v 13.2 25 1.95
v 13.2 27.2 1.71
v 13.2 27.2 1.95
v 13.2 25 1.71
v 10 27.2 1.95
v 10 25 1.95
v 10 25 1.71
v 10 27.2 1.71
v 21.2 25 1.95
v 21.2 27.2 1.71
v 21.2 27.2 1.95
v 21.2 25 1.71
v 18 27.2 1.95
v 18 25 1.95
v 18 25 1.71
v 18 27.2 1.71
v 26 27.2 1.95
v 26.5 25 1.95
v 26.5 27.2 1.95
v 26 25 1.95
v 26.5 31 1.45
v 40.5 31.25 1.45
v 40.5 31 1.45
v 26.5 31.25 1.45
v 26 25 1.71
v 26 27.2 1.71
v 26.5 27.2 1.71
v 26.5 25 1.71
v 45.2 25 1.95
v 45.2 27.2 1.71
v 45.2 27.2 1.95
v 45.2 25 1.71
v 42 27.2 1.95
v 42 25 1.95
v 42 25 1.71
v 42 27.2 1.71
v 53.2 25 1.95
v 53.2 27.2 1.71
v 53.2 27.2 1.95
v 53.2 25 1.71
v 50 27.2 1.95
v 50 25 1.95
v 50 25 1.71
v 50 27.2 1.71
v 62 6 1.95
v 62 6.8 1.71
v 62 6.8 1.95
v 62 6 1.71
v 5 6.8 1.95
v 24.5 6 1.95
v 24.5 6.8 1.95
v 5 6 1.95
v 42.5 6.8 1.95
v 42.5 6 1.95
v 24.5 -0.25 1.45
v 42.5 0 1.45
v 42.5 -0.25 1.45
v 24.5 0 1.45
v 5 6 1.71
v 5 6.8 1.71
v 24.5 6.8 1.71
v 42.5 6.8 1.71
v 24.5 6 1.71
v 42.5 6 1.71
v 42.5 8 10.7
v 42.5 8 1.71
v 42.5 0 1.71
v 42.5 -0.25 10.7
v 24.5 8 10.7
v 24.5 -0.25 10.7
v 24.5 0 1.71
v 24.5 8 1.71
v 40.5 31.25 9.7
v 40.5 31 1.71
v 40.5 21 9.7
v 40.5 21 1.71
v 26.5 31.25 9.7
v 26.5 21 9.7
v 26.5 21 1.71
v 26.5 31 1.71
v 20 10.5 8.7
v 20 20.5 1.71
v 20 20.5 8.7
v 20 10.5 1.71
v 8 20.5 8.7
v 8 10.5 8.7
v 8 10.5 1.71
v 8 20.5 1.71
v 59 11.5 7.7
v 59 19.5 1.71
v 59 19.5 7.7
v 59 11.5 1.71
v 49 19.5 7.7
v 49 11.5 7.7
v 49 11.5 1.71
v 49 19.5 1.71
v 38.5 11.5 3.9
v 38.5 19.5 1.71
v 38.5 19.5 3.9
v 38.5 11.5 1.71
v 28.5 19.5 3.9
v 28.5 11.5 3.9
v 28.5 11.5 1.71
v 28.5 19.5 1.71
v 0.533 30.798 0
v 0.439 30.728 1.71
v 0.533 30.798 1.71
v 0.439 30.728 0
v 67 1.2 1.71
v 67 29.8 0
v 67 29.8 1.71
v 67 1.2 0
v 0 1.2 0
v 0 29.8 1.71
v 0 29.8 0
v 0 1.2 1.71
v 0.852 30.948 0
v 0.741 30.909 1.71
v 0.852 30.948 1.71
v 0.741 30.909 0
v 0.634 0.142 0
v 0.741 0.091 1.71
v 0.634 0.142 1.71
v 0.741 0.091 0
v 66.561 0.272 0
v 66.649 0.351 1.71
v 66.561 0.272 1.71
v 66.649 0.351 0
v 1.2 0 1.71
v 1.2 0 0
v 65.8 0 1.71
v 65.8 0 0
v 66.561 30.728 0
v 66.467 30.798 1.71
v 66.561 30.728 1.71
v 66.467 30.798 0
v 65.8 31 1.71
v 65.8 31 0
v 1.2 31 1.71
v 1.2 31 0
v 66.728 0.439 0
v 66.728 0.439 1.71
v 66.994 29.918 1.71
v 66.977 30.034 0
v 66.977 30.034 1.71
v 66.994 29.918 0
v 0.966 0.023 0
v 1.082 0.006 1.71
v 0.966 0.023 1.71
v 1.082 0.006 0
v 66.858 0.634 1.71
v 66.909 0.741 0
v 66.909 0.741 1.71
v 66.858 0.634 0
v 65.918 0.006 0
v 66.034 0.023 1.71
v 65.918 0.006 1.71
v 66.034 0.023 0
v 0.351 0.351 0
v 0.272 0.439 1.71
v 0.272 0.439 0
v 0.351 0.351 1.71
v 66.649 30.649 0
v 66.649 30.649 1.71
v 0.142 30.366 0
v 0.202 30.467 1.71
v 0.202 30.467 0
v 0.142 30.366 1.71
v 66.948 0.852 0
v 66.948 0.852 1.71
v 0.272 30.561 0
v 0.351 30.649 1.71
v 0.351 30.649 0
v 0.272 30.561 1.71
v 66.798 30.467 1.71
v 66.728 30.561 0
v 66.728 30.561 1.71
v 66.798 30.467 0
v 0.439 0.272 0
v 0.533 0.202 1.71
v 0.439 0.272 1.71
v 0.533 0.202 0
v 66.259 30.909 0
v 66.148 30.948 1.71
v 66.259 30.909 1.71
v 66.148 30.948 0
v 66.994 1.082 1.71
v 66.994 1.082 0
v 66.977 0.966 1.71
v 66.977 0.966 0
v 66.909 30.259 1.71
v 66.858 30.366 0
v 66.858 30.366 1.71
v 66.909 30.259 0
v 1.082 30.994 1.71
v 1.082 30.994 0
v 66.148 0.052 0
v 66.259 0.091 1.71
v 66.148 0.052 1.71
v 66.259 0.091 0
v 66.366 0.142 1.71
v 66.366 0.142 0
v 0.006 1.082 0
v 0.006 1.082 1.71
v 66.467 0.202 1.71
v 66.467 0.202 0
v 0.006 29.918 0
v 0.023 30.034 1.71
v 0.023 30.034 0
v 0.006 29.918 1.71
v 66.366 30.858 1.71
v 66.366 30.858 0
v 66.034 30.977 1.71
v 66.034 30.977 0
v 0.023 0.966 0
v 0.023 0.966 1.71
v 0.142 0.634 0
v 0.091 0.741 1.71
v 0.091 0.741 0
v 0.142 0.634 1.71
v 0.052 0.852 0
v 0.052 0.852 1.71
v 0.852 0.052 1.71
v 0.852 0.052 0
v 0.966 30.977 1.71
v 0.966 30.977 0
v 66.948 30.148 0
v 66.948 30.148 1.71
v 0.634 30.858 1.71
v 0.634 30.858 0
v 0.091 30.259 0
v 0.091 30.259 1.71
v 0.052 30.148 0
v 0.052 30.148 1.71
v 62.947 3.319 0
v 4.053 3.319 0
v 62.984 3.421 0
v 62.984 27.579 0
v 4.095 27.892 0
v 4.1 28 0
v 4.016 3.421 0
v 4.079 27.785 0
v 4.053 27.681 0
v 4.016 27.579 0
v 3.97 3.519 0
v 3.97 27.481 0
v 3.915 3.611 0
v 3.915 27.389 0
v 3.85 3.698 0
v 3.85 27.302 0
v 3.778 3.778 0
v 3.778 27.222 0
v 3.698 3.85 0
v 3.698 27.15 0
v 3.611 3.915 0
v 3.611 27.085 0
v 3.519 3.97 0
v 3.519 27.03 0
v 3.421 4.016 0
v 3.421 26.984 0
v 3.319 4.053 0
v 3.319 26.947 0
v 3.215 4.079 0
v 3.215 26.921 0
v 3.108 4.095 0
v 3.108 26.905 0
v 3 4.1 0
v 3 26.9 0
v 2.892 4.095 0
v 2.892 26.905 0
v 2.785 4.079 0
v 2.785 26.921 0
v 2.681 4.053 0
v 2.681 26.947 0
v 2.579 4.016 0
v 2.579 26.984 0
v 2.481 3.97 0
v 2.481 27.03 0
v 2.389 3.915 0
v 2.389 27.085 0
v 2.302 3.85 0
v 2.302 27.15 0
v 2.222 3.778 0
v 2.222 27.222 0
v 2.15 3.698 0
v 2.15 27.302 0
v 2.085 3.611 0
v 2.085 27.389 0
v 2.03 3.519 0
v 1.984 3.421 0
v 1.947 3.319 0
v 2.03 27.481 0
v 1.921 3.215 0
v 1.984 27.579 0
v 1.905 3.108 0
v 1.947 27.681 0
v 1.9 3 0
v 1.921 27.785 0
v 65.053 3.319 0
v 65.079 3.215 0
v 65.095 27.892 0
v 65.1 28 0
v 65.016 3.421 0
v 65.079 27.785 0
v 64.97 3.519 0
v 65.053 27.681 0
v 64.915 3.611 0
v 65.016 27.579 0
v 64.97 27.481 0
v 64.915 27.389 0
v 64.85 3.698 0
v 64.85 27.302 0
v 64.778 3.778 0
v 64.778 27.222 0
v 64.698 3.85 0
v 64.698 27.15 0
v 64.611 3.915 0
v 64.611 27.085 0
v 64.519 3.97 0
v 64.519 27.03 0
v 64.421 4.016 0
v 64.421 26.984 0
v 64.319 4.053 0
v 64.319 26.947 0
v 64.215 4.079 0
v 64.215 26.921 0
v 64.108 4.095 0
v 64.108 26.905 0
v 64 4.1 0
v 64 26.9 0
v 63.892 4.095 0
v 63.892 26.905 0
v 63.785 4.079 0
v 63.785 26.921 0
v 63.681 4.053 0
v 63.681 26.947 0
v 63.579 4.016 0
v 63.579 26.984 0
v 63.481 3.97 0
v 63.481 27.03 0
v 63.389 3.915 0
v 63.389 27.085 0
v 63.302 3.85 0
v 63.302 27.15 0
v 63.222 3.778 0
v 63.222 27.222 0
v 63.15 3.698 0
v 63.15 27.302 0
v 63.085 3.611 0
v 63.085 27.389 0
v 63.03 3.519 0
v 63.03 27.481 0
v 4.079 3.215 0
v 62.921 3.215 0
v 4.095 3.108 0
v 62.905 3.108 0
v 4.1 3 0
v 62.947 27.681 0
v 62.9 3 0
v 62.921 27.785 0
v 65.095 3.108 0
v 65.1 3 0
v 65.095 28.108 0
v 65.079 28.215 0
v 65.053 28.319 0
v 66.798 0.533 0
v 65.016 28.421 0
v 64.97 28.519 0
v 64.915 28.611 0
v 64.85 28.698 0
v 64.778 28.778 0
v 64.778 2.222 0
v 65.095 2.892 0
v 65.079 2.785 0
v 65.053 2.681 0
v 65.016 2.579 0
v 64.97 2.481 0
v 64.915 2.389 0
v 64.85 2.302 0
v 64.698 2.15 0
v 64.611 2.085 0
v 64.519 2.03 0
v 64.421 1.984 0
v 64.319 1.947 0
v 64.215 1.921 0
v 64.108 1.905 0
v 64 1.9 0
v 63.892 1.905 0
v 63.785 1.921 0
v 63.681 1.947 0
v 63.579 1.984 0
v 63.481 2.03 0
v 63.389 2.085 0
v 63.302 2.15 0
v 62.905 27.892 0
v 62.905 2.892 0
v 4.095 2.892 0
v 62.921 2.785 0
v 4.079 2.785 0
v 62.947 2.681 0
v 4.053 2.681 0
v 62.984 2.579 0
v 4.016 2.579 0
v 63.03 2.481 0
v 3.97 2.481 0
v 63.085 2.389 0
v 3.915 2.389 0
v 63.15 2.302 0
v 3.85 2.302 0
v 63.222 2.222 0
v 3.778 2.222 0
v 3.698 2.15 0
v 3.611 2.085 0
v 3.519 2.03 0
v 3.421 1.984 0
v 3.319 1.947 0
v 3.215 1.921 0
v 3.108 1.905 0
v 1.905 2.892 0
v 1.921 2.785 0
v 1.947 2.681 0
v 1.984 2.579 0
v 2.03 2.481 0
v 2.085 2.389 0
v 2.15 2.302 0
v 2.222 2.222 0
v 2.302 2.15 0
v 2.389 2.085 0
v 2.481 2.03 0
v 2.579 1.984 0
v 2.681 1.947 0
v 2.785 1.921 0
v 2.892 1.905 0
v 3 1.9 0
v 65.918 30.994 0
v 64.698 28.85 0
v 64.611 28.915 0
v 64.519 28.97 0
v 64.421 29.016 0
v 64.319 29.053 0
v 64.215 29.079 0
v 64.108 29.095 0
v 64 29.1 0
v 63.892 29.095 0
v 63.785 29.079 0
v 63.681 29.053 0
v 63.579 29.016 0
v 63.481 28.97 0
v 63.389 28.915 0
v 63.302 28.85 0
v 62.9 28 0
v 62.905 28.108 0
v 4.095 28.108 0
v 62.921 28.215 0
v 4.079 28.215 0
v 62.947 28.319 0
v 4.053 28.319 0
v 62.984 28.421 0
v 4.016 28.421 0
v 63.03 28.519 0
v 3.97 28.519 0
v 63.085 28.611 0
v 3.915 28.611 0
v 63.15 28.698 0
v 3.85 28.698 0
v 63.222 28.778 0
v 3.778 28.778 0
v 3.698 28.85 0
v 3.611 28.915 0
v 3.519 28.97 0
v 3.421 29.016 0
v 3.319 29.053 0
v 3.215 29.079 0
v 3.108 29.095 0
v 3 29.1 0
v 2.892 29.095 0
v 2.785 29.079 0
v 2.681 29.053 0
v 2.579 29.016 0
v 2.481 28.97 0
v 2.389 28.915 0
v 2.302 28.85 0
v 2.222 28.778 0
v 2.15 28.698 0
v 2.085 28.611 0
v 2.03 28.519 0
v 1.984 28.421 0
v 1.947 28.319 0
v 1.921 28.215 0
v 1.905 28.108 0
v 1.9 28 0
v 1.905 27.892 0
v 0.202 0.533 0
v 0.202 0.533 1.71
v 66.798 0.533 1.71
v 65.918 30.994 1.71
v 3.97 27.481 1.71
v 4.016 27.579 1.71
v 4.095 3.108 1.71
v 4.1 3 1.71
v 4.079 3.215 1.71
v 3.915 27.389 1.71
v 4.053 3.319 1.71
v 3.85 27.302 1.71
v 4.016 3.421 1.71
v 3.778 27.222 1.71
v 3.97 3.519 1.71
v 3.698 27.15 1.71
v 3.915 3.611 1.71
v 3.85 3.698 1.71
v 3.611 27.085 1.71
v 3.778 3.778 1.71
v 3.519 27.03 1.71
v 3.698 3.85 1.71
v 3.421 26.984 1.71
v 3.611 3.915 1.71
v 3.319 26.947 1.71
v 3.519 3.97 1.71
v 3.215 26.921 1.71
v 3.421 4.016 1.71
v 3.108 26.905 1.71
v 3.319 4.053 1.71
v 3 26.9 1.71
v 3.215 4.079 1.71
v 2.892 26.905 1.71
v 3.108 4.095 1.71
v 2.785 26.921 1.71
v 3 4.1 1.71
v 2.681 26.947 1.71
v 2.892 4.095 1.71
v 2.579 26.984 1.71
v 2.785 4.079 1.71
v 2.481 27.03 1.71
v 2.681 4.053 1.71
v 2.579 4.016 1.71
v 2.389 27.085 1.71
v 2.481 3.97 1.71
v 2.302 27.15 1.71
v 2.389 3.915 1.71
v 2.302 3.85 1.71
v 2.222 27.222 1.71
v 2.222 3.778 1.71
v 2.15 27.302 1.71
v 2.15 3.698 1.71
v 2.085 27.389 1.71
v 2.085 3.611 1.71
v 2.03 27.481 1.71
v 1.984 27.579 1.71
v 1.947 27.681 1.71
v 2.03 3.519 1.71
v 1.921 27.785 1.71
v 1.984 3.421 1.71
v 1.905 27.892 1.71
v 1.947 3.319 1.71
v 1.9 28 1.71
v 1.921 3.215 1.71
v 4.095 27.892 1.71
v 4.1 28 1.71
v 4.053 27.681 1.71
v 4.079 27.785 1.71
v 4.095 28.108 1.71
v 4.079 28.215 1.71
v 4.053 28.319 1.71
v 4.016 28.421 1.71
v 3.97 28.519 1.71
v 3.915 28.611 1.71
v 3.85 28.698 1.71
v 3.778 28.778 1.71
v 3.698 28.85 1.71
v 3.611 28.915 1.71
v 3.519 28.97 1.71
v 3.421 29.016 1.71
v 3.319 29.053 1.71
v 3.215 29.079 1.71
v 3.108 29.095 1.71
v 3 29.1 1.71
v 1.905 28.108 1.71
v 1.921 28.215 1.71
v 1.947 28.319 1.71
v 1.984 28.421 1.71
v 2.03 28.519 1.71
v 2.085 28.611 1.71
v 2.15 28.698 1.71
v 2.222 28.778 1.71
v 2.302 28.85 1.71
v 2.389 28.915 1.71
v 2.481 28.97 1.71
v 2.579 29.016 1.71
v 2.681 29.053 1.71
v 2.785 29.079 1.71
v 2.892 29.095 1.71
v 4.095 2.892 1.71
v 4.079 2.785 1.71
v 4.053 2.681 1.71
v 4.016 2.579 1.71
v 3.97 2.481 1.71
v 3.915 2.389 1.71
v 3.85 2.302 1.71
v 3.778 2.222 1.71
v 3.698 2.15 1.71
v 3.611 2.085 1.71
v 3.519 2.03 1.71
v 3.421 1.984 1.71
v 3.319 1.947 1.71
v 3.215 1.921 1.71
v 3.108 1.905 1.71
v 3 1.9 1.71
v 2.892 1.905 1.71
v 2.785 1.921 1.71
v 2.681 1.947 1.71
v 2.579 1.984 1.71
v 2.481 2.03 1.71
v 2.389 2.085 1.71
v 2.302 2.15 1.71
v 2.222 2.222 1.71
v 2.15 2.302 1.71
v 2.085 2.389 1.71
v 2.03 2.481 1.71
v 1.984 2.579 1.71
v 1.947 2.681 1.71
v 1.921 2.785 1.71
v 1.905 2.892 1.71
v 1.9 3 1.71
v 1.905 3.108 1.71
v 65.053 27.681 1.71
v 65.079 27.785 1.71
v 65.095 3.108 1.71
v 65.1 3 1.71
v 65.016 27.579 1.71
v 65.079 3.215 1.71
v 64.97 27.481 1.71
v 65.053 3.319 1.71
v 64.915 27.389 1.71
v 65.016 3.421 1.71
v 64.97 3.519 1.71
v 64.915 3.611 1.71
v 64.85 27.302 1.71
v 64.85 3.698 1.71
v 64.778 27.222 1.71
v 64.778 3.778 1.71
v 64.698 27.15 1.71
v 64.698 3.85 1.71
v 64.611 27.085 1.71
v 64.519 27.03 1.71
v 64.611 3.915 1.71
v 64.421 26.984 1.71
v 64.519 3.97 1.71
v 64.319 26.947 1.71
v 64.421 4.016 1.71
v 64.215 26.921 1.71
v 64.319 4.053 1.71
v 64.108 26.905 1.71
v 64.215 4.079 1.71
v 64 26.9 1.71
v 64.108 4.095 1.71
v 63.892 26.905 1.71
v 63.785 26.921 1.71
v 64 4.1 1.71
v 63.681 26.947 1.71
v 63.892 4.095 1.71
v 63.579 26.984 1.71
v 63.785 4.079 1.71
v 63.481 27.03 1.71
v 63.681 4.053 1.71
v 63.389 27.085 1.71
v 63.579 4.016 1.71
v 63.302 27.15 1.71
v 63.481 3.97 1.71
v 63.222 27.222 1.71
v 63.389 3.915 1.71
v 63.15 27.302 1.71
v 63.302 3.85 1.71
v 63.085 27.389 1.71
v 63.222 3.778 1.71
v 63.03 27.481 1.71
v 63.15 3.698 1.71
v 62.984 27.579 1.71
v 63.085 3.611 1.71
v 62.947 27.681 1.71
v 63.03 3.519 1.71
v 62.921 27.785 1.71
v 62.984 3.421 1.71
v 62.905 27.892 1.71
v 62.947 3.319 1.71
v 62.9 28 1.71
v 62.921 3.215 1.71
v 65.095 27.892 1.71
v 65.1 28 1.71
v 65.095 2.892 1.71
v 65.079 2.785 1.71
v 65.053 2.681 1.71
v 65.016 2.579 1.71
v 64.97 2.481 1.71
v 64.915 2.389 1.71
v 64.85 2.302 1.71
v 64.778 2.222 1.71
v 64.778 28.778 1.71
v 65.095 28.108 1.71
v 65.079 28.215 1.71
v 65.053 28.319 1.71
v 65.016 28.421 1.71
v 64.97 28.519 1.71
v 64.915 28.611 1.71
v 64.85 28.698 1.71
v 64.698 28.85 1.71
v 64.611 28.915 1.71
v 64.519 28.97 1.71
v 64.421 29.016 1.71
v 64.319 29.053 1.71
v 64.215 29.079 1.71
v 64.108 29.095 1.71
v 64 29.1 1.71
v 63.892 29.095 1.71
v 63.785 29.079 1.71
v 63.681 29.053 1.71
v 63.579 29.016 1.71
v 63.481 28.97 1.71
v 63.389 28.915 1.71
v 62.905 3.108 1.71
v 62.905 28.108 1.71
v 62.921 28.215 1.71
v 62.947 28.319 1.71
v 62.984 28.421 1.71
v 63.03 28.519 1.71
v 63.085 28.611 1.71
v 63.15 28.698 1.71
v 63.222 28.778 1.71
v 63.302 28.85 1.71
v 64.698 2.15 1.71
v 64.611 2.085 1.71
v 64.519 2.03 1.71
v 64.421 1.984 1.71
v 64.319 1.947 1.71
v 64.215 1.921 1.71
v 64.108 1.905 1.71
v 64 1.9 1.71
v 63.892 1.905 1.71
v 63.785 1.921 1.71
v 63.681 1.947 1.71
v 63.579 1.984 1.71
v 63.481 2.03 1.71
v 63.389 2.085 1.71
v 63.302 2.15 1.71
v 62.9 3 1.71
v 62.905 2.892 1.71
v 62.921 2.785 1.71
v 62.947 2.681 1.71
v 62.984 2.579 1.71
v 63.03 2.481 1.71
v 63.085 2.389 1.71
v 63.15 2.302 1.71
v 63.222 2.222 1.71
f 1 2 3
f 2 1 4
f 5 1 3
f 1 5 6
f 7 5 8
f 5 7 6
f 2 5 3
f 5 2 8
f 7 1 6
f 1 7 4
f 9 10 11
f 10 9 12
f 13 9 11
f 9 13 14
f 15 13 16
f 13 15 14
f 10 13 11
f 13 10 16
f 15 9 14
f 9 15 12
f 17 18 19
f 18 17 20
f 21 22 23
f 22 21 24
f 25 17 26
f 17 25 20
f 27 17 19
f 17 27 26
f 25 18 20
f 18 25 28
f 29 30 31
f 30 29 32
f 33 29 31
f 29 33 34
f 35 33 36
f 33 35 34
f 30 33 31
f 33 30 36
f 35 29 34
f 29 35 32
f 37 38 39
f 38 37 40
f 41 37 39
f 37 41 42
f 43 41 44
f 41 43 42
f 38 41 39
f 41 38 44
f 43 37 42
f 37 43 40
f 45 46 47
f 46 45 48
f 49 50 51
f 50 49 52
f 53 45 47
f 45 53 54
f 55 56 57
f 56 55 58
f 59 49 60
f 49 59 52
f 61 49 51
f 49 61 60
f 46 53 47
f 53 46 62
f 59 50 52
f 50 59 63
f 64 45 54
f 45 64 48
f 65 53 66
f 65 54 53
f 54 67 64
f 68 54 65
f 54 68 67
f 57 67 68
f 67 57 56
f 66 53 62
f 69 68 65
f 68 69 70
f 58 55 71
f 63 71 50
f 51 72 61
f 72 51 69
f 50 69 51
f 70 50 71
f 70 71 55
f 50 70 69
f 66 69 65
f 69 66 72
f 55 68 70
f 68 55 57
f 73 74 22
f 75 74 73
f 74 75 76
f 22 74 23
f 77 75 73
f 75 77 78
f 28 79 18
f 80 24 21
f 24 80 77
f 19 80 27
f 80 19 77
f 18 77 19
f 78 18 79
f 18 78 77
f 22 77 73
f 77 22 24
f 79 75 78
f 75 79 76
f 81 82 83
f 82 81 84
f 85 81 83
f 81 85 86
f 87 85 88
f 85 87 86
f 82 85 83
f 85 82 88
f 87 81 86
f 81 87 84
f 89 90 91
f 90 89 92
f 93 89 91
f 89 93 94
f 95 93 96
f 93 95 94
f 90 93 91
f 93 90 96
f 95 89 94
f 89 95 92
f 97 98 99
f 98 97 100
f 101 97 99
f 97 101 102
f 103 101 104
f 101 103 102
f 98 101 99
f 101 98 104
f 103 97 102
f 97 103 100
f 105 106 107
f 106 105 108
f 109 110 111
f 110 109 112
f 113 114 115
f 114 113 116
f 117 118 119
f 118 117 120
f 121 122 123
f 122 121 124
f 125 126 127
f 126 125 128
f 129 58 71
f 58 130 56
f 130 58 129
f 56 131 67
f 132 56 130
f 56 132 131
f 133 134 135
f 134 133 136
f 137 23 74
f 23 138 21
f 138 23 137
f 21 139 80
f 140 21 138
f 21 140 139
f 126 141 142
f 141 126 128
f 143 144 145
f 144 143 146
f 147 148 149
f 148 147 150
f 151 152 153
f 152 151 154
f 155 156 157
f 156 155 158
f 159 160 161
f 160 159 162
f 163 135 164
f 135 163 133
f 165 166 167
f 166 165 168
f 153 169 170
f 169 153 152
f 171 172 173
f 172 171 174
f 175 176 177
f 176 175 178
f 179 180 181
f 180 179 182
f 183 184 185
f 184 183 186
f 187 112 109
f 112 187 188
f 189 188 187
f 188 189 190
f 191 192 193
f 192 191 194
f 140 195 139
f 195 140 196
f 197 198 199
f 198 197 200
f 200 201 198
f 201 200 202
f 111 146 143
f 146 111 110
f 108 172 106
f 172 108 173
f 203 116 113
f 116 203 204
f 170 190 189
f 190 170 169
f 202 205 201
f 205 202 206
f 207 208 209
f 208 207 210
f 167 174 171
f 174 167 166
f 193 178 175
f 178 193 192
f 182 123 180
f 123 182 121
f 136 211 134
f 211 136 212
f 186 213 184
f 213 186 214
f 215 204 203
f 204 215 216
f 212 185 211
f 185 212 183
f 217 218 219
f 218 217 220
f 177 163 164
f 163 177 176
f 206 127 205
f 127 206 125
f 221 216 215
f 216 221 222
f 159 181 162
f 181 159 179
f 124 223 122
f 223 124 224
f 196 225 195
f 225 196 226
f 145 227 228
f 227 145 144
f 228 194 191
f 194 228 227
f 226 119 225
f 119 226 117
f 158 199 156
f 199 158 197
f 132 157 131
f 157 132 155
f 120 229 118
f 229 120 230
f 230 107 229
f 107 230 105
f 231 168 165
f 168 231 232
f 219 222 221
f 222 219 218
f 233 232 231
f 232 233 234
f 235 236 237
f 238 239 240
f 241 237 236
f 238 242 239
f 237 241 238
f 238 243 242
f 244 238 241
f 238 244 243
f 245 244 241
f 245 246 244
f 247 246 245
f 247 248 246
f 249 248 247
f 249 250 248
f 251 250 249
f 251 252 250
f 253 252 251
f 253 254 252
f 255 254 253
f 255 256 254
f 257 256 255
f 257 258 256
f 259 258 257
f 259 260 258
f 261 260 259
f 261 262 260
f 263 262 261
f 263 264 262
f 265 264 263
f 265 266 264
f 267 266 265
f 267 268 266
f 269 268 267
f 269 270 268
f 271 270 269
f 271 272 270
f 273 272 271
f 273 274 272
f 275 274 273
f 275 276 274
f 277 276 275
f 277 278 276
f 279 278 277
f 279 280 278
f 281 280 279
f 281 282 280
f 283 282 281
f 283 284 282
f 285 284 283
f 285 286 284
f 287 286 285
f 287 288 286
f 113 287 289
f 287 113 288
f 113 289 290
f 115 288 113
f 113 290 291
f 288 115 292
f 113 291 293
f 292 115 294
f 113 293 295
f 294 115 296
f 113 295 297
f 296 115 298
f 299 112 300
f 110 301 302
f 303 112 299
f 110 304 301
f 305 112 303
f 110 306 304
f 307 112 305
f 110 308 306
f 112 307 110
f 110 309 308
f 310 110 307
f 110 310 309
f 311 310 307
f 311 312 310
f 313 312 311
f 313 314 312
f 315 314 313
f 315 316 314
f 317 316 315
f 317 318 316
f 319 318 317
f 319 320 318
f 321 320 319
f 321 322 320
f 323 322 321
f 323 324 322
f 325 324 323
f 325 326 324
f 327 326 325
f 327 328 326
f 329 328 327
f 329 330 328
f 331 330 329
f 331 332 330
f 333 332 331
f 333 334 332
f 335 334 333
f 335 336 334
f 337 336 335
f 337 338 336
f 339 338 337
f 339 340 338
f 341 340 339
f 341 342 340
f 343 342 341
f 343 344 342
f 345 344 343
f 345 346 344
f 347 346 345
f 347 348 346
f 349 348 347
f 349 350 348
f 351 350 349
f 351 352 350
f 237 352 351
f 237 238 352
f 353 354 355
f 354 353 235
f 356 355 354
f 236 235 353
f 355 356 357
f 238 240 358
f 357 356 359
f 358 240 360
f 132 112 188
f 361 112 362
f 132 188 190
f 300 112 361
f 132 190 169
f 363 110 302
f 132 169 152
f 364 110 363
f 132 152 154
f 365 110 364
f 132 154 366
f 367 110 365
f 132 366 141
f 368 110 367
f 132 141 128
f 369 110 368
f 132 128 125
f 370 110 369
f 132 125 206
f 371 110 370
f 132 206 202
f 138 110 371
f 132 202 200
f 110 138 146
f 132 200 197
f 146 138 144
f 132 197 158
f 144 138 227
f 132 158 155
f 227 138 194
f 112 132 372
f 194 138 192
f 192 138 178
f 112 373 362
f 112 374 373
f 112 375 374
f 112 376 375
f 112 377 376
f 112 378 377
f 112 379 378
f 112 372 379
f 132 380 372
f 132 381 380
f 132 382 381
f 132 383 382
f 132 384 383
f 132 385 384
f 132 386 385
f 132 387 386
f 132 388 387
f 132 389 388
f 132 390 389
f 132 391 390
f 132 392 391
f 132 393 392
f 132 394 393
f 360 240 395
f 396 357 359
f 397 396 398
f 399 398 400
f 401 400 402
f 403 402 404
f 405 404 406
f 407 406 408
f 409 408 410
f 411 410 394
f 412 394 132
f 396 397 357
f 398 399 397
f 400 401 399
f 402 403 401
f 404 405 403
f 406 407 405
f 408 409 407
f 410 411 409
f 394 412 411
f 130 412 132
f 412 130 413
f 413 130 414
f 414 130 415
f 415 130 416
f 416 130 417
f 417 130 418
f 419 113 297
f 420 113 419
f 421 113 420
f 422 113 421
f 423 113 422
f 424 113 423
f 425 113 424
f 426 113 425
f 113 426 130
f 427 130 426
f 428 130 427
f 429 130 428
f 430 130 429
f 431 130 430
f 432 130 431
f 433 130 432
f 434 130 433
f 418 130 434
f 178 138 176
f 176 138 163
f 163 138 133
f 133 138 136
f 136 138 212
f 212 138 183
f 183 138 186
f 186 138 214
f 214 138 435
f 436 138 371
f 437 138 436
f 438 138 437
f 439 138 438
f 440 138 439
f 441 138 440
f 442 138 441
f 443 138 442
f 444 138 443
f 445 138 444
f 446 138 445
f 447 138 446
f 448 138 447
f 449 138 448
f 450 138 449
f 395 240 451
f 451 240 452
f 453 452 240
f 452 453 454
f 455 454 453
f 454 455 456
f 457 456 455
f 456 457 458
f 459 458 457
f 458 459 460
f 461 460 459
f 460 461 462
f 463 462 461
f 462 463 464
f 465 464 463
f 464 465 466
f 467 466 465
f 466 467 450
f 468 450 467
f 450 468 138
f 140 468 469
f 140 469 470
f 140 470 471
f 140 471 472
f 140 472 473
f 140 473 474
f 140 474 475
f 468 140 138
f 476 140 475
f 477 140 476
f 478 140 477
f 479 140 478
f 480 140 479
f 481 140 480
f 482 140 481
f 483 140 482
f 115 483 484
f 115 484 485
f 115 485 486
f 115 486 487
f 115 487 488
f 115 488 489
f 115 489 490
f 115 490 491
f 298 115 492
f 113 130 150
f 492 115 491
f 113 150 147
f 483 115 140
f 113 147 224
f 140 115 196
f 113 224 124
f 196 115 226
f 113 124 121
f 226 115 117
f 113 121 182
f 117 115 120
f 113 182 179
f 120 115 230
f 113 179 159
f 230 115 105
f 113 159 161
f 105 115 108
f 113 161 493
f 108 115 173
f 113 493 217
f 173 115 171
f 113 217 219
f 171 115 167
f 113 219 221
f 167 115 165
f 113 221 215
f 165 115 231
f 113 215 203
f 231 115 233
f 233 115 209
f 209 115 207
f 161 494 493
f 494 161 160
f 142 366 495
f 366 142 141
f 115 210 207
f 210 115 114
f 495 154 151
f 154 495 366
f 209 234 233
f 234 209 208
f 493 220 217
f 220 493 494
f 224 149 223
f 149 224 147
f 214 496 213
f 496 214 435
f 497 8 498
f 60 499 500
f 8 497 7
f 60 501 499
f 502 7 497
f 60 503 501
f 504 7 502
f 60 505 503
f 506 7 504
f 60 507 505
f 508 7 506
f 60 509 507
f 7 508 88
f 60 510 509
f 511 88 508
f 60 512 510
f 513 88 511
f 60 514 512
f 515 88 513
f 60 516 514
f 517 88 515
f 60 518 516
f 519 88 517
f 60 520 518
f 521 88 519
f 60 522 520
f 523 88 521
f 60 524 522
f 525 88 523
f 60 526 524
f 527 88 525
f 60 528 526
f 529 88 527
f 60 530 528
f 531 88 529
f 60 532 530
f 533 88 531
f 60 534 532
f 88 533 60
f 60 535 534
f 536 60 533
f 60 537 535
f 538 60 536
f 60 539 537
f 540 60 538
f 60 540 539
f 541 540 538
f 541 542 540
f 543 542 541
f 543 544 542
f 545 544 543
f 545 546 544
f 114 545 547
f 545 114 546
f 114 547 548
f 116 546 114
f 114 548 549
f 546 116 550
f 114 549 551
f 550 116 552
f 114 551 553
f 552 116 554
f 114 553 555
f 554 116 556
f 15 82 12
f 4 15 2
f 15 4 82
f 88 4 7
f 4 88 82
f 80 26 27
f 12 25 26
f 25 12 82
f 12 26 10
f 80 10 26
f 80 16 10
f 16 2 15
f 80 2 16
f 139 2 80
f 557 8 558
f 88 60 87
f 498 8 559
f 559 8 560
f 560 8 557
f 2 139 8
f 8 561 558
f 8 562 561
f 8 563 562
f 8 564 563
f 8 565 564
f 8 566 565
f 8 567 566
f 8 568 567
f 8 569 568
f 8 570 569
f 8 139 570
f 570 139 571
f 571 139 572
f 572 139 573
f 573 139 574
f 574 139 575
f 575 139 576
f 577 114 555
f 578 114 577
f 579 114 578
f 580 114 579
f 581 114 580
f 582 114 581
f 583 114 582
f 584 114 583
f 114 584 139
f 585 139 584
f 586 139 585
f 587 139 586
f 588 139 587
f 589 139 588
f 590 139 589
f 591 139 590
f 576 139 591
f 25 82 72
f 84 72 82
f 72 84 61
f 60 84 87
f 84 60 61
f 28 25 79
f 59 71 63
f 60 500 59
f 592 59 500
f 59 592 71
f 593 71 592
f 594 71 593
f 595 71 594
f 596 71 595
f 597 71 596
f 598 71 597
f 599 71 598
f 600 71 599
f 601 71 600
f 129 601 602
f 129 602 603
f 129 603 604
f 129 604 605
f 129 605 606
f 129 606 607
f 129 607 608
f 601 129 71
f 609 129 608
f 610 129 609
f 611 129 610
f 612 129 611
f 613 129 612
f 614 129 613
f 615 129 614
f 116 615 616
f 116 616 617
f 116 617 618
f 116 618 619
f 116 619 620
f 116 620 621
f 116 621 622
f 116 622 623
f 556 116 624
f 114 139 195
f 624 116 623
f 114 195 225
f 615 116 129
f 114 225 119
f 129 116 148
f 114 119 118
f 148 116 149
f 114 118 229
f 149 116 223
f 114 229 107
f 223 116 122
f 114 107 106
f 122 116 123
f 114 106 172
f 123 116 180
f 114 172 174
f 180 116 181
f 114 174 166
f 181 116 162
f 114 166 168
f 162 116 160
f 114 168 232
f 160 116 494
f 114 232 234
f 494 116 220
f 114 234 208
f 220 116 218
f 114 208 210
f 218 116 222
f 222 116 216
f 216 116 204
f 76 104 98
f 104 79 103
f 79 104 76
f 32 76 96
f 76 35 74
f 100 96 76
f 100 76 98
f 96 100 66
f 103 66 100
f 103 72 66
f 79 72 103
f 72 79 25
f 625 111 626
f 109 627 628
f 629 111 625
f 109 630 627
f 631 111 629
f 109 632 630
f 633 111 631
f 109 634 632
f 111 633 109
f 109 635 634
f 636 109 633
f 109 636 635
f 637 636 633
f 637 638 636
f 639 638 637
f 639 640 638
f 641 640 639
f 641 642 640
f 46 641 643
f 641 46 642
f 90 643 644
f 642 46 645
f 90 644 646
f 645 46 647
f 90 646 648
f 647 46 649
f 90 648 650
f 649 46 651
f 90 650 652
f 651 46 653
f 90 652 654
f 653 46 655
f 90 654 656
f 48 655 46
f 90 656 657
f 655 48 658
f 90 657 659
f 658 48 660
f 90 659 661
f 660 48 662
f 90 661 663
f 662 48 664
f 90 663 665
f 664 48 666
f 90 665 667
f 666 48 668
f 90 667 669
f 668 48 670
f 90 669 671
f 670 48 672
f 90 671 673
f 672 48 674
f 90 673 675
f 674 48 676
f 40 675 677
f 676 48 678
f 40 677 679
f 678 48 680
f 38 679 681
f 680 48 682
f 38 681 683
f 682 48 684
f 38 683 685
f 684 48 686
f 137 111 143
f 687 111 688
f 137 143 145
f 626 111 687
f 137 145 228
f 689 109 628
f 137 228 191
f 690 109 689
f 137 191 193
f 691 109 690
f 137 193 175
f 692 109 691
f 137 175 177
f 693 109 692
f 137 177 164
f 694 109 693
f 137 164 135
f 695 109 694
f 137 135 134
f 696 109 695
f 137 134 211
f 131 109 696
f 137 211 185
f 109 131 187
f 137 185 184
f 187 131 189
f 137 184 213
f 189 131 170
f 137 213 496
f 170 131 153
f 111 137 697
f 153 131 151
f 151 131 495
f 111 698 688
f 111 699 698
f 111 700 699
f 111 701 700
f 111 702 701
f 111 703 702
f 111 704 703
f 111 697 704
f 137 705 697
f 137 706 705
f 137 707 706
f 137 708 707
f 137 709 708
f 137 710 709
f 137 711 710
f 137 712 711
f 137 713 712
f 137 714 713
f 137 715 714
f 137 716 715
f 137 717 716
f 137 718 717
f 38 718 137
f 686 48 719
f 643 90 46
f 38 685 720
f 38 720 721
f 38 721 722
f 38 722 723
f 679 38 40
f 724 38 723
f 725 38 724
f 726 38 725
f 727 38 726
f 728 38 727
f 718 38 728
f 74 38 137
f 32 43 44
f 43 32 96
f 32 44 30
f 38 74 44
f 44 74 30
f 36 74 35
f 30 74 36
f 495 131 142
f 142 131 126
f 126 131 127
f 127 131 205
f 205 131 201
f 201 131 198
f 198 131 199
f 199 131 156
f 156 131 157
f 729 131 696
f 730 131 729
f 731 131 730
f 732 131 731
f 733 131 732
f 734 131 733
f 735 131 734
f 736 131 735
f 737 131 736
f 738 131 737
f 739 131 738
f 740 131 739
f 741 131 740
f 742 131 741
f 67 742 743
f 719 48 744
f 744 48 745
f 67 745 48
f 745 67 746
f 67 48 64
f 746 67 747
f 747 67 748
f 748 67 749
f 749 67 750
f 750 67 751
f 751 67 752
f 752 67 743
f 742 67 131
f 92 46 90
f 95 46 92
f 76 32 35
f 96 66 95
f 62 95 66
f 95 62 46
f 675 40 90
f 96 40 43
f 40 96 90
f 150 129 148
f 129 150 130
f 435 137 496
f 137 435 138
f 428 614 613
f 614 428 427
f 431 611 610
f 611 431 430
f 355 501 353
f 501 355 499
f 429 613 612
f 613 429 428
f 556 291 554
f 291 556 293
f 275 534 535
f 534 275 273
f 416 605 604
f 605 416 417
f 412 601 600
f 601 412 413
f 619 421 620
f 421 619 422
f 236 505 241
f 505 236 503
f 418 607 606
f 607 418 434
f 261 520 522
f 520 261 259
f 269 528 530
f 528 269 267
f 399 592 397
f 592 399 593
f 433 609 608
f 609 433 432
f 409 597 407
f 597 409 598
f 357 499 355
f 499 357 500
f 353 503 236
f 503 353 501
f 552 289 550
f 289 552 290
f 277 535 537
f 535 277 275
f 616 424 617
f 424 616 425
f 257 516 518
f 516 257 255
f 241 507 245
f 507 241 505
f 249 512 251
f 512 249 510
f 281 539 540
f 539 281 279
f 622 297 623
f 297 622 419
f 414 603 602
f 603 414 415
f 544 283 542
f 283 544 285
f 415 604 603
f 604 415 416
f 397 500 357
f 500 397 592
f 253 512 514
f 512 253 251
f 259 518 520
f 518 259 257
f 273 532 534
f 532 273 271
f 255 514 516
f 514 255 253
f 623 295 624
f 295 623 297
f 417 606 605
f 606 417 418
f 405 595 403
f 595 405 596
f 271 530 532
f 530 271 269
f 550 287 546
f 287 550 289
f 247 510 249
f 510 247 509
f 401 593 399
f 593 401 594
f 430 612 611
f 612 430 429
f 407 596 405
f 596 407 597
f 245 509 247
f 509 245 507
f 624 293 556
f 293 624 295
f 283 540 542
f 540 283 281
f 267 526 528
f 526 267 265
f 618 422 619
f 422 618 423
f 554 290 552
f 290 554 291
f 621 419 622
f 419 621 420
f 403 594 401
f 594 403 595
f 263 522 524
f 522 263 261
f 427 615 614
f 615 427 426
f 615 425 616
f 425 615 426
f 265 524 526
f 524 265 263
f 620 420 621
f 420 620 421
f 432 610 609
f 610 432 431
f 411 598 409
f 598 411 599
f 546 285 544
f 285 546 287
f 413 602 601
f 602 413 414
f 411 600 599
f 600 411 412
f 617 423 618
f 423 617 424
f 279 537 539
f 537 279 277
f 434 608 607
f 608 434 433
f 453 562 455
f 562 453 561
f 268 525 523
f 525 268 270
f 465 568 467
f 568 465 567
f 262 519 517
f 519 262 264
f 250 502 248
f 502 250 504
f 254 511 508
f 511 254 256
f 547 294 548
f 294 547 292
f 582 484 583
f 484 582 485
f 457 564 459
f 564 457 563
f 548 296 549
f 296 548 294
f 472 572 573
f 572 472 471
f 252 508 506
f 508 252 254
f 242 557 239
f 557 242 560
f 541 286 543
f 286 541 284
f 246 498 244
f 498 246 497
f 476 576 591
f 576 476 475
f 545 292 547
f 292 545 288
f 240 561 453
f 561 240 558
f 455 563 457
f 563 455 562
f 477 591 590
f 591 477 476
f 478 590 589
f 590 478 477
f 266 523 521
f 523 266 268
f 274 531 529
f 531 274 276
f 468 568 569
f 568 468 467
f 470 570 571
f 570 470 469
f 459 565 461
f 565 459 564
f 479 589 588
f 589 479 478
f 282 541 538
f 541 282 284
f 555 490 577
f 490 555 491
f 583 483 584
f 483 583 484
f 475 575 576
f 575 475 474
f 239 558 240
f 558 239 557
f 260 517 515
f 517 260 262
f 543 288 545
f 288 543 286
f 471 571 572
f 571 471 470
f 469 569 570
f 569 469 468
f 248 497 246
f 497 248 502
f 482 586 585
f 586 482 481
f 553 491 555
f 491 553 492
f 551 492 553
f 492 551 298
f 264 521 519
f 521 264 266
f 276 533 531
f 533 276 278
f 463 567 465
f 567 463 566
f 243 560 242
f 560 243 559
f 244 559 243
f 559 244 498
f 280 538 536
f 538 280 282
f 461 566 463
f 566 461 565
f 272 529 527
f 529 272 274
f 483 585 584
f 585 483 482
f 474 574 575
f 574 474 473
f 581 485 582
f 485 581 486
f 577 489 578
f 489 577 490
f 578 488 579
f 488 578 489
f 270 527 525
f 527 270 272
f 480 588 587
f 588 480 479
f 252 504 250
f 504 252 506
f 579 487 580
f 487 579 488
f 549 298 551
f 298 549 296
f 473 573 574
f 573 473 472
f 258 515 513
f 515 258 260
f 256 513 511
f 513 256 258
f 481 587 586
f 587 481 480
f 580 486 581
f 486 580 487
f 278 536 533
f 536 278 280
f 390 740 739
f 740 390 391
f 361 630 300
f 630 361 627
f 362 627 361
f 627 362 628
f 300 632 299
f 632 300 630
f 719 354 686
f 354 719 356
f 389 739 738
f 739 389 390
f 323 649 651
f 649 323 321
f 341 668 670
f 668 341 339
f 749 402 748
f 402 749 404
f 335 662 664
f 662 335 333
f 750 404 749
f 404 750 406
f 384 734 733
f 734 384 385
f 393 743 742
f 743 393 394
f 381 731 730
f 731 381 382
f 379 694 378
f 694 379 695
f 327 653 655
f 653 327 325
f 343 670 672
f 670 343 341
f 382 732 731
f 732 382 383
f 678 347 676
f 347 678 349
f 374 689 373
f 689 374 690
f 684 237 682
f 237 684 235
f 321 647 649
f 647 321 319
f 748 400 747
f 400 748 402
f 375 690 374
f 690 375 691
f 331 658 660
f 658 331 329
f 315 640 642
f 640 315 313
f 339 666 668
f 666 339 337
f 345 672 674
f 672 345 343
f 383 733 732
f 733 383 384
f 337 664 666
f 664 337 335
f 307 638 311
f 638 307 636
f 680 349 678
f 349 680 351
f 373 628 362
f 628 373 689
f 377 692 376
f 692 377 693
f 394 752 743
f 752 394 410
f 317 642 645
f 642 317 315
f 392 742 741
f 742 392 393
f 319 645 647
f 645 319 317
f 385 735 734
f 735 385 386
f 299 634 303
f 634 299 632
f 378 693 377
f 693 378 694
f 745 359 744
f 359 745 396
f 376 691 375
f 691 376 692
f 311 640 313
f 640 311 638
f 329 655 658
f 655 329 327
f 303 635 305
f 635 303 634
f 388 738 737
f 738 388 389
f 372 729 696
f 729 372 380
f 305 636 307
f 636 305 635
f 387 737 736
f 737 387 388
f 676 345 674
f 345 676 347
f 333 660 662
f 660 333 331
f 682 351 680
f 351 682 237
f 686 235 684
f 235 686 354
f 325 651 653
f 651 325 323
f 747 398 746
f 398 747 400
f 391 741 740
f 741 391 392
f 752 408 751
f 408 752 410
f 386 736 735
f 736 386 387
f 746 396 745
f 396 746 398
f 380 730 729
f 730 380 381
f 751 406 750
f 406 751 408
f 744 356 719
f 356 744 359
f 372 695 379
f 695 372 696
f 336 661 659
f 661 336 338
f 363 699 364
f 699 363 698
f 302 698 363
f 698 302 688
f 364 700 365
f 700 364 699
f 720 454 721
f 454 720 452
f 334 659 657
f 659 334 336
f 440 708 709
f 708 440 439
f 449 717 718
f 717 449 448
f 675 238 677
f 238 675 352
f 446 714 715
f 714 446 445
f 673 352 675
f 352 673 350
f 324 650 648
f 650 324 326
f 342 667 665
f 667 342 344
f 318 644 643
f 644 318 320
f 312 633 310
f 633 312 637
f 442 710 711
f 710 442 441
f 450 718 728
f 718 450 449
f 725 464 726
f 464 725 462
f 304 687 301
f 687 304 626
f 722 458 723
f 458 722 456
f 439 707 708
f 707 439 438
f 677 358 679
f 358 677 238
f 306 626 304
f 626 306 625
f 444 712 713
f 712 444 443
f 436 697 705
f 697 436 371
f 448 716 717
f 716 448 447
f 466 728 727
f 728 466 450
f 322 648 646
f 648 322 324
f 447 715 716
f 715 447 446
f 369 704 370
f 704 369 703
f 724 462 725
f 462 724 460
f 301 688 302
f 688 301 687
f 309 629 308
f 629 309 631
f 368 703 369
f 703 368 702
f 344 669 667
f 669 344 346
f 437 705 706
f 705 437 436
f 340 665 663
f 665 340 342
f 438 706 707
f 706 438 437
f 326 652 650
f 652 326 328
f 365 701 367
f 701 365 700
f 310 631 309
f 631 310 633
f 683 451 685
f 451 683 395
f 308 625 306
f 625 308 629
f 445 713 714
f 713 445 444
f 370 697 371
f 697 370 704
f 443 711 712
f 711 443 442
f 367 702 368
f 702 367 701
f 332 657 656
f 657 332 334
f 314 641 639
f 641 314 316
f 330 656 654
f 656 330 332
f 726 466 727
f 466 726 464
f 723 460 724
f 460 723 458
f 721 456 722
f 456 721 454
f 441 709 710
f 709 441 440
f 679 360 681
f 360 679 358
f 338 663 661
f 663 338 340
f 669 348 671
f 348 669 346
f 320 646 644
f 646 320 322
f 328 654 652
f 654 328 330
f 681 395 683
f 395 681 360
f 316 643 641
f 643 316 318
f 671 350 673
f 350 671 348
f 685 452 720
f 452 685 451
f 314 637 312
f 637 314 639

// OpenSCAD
// Power supply board (single connected solid)
// Overall PCB: 67.0mm x 31.0mm x 1.7mm

$fn = 64;

// --- Parameters ---
pcb_L = 67.0;
pcb_W = 31.0;
pcb_T = 1.7;

// Corner radius (visual only; keeps exact outer dims via minkowski with reduced core)
corner_r = 1.2;

// Mounting holes (subtracted)
hole_d = 2.2;
hole_edge = 3.0; // distance from each edge to hole center

// Small overlap to guarantee connectivity between added features and PCB
ov = 0.25;

// --- Helpers ---
module rounded_pcb(L, W, T, r) {
    // Rounded rectangle prism with exact outer L/W
    minkowski() {
        translate([r, r, 0])
            cube([L - 2*r, W - 2*r, T], center=false);
        cylinder(r=r, h=0.01, center=false);
    }
}

module mounting_holes_subtract() {
    for (x = [hole_edge, pcb_L - hole_edge])
        for (y = [hole_edge, pcb_W - hole_edge])
            translate([x, y, -1])
                cylinder(h = pcb_T + 2, d = hole_d, center=false);
}

// Simple raised copper/silkscreen-like pads (kept as solid, connected)
module top_pads() {
    pad_h = 0.25;
    // Long trace strip
    translate([5, 6, pcb_T - ov])
        cube([pcb_L - 10, 0.8, pad_h + ov], center=false);

    // A few pads
    for (i = [0:5]) {
        px = 10 + i * 8;
        translate([px, pcb_W - 6, pcb_T - ov])
            cube([3.2, 2.2, pad_h + ov], center=false);
    }
}

// Connector blocks (solid, connected)
module connectors_and_components() {
    // Terminal block along one long edge
    term_L = 18;
    term_W = 8;
    term_H = 9;

    translate([(pcb_L - term_L)/2, -ov, pcb_T - ov])
        cube([term_L, term_W + ov, term_H + ov], center=false);

    // DC jack-like block on opposite edge
    jack_L = 14;
    jack_W = 10;
    jack_H = 8;

    translate([(pcb_L - jack_L)/2, pcb_W - jack_W, pcb_T - ov])
        cube([jack_L, jack_W + ov, jack_H + ov], center=false);

    // Inductor/capacitor-like components
    comp1 = [12, 10, 7];
    translate([8, (pcb_W - comp1[1])/2, pcb_T - ov])
        cube([comp1[0], comp1[1], comp1[2] + ov], center=false);

    comp2 = [10, 8, 6];
    translate([pcb_L - 8 - comp2[0], (pcb_W - comp2[1])/2, pcb_T - ov])
        cube([comp2[0], comp2[1], comp2[2] + ov], center=false);

    // Small IC block
    ic = [10, 8, 2.2];
    translate([(pcb_L - ic[0])/2, (pcb_W - ic[1])/2, pcb_T - ov])
        cube([ic[0], ic[1], ic[2] + ov], center=false);
}

// Small underside solder bumps (solid, connected)
module bottom_bumps() {
    bump_d = 1.2;
    bump_h = 0.5;

    for (x = [hole_edge, pcb_L - hole_edge])
        for (y = [hole_edge, pcb_W - hole_edge])
            translate([x, y, -bump_h + ov])
                cylinder(h=bump_h + ov, d=bump_d, center=false);
}

// --- Assembly (ONE connected solid) ---
difference() {
    union() {
        // PCB body
        rounded_pcb(pcb_L, pcb_W, pcb_T, corner_r);

        // Top details
        top_pads();
        connectors_and_components();

        // Bottom details
        bottom_bumps();
    }

    // Subtract mounting holes through PCB
    mounting_holes_subtract();
}
